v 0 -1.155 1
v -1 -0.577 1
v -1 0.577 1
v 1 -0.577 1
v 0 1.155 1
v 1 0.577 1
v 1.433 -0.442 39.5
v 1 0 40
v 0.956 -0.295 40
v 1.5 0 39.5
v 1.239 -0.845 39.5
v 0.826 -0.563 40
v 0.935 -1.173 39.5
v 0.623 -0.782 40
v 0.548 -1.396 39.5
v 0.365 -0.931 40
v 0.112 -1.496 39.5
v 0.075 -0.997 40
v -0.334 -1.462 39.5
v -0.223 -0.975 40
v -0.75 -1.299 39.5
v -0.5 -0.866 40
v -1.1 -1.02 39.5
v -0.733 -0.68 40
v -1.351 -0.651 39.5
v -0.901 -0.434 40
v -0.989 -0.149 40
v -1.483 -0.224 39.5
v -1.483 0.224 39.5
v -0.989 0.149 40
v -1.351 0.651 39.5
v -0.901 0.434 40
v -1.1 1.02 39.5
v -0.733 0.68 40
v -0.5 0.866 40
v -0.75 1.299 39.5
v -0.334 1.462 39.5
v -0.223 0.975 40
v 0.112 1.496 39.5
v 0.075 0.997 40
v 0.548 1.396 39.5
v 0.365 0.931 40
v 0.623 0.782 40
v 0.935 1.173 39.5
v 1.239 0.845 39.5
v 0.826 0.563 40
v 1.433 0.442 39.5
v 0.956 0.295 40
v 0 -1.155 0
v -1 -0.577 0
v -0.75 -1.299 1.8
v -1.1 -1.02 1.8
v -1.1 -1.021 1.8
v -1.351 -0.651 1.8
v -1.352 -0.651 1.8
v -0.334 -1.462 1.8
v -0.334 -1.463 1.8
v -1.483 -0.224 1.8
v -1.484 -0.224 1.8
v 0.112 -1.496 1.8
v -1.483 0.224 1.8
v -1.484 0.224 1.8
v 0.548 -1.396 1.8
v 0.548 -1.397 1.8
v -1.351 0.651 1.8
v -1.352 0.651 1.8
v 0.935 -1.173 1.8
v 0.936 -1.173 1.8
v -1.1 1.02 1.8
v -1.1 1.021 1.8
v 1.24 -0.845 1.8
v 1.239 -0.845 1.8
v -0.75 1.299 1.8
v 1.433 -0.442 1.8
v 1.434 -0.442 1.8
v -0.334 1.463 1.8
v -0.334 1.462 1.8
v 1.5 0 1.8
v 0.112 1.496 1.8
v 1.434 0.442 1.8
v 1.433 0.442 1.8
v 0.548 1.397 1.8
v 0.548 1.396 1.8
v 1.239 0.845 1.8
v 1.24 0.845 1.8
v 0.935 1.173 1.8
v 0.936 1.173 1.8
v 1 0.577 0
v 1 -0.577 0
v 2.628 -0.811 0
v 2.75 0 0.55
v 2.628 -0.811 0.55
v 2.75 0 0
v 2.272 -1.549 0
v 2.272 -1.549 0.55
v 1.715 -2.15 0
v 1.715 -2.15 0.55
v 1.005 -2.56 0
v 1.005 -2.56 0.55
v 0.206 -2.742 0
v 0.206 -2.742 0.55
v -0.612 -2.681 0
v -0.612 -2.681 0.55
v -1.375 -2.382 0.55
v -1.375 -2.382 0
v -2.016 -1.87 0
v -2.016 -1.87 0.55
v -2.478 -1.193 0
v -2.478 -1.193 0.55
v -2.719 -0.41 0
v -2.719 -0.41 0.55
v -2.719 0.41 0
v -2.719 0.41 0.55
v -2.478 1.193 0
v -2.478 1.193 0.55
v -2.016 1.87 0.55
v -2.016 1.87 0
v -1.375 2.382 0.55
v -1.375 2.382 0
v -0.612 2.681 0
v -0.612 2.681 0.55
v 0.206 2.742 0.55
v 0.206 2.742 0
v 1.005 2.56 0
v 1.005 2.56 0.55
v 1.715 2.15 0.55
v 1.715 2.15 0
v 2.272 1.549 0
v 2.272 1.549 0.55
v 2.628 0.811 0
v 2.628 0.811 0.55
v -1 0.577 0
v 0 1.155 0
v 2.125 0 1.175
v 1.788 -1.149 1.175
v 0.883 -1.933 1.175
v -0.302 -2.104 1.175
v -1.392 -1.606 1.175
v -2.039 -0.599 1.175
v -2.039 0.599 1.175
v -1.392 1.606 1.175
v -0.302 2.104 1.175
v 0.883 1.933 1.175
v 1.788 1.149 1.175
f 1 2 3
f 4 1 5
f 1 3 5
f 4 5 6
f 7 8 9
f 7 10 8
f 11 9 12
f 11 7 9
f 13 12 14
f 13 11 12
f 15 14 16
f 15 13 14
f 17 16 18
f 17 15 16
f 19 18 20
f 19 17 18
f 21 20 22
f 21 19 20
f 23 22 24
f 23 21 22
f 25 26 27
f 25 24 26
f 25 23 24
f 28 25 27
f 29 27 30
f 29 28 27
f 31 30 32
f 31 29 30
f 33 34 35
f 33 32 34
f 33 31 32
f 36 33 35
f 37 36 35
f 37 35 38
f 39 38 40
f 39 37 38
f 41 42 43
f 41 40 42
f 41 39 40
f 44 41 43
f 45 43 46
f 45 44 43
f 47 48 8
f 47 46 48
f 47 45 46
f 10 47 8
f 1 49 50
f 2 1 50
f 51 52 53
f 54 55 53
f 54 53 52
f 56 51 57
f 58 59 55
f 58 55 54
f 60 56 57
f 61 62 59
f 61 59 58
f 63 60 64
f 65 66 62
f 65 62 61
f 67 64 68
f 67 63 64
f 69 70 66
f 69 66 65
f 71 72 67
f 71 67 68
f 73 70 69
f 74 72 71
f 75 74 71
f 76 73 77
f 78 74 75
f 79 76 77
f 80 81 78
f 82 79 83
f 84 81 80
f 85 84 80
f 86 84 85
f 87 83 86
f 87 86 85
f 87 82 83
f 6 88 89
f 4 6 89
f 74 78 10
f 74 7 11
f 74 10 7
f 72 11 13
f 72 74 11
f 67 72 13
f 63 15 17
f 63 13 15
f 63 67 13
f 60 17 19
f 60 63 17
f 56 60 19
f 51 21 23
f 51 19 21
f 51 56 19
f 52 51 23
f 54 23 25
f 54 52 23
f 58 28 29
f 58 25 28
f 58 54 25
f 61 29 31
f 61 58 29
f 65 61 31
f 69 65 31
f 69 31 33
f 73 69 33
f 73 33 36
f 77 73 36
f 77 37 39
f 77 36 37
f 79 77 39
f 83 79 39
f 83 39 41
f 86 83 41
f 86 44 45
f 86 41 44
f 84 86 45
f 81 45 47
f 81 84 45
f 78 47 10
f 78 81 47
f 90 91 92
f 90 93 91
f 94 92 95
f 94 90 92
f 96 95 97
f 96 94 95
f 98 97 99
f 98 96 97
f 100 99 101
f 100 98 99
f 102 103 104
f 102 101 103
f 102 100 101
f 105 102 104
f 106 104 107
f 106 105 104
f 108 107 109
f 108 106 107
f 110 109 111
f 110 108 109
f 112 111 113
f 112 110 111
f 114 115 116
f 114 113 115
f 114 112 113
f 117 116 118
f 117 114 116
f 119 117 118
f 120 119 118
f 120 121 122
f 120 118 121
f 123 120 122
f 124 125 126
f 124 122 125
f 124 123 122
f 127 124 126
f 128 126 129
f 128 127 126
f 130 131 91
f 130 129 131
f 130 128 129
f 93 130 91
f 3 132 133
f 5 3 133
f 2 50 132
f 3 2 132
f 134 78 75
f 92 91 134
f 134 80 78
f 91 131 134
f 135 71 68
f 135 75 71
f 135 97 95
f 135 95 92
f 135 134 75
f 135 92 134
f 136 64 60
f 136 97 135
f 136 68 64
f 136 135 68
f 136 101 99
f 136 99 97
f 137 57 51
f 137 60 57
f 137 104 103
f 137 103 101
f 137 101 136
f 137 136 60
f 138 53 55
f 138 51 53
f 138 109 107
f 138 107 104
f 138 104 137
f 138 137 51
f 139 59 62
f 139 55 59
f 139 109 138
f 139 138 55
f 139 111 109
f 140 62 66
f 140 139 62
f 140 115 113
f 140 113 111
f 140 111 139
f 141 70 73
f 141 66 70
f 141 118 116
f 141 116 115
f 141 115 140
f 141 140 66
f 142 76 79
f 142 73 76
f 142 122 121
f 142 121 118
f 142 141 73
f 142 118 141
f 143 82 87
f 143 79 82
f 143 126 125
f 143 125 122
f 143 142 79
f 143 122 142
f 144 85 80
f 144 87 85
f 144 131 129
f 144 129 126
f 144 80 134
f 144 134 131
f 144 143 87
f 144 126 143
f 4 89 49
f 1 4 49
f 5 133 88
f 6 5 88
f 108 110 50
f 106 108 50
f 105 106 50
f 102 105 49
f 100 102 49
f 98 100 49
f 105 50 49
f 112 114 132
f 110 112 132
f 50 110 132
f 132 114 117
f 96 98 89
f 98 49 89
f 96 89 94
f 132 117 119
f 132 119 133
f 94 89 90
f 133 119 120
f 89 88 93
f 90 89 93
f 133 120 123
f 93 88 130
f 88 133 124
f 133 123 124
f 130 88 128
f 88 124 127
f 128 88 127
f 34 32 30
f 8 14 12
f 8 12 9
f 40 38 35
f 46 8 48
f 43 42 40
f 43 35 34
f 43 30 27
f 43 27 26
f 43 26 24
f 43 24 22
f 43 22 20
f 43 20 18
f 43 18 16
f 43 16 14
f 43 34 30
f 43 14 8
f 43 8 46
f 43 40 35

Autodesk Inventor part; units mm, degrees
ref_plane "YZ Plane" through (0, 0, 0) normal (1, 0, 0) x (0, 1, 0)
ref_plane "XZ Plane" through (0, 0, 0) normal (0, 1, 0) x (-1, 0, 0)
ref_plane "XY Plane" through (0, 0, 0) normal (0, 0, 1) x (1, 0, 0)
sketch "Эскиз1" plane through (0, 0, 0) normal (0, 0, 1) x (1, 0, 0)
  circle A0 centre (0, 0) radius 1.5
  circle A1 centre (0, 0) radius 2.75
  line L0 (0, 1.1547) -> (1, 0.5774)
  line L1 (1, 0.5774) -> (1, -0.5774)
  line L2 (1, -0.5774) -> (0, -1.1547)
  line L3 (0, -1.1547) -> (-1, -0.5774)
  line L4 (-1, -0.5774) -> (-1, 0.5774)
  line L5 (-1, 0.5774) -> (0, 1.1547)
  dimension "d0" = 3
  dimension "d1" = 5.5
  dimension "d2" = 2
extrude "Выдавливание1" add sketch "Эскиз1" along normal blind 40 contours A0 | L0 L1 L2 L3 L4 L5
extrude "Выдавливание2" add sketch "Эскиз1" along normal blind 1.8 contours A1
chamfer "Фаска1" distance 1.25 angle 45 1 edges at (-2.75, 0, 1.8)
extrude "Выдавливание3" cut sketch "Эскиз1" along normal blind 1 contours L0 L1 L2 L3 L4 L5
chamfer "Фаска2" distance 0.5 angle 45 1 edges at (-1.5, 0, 40)
properties part number "M3X40"
